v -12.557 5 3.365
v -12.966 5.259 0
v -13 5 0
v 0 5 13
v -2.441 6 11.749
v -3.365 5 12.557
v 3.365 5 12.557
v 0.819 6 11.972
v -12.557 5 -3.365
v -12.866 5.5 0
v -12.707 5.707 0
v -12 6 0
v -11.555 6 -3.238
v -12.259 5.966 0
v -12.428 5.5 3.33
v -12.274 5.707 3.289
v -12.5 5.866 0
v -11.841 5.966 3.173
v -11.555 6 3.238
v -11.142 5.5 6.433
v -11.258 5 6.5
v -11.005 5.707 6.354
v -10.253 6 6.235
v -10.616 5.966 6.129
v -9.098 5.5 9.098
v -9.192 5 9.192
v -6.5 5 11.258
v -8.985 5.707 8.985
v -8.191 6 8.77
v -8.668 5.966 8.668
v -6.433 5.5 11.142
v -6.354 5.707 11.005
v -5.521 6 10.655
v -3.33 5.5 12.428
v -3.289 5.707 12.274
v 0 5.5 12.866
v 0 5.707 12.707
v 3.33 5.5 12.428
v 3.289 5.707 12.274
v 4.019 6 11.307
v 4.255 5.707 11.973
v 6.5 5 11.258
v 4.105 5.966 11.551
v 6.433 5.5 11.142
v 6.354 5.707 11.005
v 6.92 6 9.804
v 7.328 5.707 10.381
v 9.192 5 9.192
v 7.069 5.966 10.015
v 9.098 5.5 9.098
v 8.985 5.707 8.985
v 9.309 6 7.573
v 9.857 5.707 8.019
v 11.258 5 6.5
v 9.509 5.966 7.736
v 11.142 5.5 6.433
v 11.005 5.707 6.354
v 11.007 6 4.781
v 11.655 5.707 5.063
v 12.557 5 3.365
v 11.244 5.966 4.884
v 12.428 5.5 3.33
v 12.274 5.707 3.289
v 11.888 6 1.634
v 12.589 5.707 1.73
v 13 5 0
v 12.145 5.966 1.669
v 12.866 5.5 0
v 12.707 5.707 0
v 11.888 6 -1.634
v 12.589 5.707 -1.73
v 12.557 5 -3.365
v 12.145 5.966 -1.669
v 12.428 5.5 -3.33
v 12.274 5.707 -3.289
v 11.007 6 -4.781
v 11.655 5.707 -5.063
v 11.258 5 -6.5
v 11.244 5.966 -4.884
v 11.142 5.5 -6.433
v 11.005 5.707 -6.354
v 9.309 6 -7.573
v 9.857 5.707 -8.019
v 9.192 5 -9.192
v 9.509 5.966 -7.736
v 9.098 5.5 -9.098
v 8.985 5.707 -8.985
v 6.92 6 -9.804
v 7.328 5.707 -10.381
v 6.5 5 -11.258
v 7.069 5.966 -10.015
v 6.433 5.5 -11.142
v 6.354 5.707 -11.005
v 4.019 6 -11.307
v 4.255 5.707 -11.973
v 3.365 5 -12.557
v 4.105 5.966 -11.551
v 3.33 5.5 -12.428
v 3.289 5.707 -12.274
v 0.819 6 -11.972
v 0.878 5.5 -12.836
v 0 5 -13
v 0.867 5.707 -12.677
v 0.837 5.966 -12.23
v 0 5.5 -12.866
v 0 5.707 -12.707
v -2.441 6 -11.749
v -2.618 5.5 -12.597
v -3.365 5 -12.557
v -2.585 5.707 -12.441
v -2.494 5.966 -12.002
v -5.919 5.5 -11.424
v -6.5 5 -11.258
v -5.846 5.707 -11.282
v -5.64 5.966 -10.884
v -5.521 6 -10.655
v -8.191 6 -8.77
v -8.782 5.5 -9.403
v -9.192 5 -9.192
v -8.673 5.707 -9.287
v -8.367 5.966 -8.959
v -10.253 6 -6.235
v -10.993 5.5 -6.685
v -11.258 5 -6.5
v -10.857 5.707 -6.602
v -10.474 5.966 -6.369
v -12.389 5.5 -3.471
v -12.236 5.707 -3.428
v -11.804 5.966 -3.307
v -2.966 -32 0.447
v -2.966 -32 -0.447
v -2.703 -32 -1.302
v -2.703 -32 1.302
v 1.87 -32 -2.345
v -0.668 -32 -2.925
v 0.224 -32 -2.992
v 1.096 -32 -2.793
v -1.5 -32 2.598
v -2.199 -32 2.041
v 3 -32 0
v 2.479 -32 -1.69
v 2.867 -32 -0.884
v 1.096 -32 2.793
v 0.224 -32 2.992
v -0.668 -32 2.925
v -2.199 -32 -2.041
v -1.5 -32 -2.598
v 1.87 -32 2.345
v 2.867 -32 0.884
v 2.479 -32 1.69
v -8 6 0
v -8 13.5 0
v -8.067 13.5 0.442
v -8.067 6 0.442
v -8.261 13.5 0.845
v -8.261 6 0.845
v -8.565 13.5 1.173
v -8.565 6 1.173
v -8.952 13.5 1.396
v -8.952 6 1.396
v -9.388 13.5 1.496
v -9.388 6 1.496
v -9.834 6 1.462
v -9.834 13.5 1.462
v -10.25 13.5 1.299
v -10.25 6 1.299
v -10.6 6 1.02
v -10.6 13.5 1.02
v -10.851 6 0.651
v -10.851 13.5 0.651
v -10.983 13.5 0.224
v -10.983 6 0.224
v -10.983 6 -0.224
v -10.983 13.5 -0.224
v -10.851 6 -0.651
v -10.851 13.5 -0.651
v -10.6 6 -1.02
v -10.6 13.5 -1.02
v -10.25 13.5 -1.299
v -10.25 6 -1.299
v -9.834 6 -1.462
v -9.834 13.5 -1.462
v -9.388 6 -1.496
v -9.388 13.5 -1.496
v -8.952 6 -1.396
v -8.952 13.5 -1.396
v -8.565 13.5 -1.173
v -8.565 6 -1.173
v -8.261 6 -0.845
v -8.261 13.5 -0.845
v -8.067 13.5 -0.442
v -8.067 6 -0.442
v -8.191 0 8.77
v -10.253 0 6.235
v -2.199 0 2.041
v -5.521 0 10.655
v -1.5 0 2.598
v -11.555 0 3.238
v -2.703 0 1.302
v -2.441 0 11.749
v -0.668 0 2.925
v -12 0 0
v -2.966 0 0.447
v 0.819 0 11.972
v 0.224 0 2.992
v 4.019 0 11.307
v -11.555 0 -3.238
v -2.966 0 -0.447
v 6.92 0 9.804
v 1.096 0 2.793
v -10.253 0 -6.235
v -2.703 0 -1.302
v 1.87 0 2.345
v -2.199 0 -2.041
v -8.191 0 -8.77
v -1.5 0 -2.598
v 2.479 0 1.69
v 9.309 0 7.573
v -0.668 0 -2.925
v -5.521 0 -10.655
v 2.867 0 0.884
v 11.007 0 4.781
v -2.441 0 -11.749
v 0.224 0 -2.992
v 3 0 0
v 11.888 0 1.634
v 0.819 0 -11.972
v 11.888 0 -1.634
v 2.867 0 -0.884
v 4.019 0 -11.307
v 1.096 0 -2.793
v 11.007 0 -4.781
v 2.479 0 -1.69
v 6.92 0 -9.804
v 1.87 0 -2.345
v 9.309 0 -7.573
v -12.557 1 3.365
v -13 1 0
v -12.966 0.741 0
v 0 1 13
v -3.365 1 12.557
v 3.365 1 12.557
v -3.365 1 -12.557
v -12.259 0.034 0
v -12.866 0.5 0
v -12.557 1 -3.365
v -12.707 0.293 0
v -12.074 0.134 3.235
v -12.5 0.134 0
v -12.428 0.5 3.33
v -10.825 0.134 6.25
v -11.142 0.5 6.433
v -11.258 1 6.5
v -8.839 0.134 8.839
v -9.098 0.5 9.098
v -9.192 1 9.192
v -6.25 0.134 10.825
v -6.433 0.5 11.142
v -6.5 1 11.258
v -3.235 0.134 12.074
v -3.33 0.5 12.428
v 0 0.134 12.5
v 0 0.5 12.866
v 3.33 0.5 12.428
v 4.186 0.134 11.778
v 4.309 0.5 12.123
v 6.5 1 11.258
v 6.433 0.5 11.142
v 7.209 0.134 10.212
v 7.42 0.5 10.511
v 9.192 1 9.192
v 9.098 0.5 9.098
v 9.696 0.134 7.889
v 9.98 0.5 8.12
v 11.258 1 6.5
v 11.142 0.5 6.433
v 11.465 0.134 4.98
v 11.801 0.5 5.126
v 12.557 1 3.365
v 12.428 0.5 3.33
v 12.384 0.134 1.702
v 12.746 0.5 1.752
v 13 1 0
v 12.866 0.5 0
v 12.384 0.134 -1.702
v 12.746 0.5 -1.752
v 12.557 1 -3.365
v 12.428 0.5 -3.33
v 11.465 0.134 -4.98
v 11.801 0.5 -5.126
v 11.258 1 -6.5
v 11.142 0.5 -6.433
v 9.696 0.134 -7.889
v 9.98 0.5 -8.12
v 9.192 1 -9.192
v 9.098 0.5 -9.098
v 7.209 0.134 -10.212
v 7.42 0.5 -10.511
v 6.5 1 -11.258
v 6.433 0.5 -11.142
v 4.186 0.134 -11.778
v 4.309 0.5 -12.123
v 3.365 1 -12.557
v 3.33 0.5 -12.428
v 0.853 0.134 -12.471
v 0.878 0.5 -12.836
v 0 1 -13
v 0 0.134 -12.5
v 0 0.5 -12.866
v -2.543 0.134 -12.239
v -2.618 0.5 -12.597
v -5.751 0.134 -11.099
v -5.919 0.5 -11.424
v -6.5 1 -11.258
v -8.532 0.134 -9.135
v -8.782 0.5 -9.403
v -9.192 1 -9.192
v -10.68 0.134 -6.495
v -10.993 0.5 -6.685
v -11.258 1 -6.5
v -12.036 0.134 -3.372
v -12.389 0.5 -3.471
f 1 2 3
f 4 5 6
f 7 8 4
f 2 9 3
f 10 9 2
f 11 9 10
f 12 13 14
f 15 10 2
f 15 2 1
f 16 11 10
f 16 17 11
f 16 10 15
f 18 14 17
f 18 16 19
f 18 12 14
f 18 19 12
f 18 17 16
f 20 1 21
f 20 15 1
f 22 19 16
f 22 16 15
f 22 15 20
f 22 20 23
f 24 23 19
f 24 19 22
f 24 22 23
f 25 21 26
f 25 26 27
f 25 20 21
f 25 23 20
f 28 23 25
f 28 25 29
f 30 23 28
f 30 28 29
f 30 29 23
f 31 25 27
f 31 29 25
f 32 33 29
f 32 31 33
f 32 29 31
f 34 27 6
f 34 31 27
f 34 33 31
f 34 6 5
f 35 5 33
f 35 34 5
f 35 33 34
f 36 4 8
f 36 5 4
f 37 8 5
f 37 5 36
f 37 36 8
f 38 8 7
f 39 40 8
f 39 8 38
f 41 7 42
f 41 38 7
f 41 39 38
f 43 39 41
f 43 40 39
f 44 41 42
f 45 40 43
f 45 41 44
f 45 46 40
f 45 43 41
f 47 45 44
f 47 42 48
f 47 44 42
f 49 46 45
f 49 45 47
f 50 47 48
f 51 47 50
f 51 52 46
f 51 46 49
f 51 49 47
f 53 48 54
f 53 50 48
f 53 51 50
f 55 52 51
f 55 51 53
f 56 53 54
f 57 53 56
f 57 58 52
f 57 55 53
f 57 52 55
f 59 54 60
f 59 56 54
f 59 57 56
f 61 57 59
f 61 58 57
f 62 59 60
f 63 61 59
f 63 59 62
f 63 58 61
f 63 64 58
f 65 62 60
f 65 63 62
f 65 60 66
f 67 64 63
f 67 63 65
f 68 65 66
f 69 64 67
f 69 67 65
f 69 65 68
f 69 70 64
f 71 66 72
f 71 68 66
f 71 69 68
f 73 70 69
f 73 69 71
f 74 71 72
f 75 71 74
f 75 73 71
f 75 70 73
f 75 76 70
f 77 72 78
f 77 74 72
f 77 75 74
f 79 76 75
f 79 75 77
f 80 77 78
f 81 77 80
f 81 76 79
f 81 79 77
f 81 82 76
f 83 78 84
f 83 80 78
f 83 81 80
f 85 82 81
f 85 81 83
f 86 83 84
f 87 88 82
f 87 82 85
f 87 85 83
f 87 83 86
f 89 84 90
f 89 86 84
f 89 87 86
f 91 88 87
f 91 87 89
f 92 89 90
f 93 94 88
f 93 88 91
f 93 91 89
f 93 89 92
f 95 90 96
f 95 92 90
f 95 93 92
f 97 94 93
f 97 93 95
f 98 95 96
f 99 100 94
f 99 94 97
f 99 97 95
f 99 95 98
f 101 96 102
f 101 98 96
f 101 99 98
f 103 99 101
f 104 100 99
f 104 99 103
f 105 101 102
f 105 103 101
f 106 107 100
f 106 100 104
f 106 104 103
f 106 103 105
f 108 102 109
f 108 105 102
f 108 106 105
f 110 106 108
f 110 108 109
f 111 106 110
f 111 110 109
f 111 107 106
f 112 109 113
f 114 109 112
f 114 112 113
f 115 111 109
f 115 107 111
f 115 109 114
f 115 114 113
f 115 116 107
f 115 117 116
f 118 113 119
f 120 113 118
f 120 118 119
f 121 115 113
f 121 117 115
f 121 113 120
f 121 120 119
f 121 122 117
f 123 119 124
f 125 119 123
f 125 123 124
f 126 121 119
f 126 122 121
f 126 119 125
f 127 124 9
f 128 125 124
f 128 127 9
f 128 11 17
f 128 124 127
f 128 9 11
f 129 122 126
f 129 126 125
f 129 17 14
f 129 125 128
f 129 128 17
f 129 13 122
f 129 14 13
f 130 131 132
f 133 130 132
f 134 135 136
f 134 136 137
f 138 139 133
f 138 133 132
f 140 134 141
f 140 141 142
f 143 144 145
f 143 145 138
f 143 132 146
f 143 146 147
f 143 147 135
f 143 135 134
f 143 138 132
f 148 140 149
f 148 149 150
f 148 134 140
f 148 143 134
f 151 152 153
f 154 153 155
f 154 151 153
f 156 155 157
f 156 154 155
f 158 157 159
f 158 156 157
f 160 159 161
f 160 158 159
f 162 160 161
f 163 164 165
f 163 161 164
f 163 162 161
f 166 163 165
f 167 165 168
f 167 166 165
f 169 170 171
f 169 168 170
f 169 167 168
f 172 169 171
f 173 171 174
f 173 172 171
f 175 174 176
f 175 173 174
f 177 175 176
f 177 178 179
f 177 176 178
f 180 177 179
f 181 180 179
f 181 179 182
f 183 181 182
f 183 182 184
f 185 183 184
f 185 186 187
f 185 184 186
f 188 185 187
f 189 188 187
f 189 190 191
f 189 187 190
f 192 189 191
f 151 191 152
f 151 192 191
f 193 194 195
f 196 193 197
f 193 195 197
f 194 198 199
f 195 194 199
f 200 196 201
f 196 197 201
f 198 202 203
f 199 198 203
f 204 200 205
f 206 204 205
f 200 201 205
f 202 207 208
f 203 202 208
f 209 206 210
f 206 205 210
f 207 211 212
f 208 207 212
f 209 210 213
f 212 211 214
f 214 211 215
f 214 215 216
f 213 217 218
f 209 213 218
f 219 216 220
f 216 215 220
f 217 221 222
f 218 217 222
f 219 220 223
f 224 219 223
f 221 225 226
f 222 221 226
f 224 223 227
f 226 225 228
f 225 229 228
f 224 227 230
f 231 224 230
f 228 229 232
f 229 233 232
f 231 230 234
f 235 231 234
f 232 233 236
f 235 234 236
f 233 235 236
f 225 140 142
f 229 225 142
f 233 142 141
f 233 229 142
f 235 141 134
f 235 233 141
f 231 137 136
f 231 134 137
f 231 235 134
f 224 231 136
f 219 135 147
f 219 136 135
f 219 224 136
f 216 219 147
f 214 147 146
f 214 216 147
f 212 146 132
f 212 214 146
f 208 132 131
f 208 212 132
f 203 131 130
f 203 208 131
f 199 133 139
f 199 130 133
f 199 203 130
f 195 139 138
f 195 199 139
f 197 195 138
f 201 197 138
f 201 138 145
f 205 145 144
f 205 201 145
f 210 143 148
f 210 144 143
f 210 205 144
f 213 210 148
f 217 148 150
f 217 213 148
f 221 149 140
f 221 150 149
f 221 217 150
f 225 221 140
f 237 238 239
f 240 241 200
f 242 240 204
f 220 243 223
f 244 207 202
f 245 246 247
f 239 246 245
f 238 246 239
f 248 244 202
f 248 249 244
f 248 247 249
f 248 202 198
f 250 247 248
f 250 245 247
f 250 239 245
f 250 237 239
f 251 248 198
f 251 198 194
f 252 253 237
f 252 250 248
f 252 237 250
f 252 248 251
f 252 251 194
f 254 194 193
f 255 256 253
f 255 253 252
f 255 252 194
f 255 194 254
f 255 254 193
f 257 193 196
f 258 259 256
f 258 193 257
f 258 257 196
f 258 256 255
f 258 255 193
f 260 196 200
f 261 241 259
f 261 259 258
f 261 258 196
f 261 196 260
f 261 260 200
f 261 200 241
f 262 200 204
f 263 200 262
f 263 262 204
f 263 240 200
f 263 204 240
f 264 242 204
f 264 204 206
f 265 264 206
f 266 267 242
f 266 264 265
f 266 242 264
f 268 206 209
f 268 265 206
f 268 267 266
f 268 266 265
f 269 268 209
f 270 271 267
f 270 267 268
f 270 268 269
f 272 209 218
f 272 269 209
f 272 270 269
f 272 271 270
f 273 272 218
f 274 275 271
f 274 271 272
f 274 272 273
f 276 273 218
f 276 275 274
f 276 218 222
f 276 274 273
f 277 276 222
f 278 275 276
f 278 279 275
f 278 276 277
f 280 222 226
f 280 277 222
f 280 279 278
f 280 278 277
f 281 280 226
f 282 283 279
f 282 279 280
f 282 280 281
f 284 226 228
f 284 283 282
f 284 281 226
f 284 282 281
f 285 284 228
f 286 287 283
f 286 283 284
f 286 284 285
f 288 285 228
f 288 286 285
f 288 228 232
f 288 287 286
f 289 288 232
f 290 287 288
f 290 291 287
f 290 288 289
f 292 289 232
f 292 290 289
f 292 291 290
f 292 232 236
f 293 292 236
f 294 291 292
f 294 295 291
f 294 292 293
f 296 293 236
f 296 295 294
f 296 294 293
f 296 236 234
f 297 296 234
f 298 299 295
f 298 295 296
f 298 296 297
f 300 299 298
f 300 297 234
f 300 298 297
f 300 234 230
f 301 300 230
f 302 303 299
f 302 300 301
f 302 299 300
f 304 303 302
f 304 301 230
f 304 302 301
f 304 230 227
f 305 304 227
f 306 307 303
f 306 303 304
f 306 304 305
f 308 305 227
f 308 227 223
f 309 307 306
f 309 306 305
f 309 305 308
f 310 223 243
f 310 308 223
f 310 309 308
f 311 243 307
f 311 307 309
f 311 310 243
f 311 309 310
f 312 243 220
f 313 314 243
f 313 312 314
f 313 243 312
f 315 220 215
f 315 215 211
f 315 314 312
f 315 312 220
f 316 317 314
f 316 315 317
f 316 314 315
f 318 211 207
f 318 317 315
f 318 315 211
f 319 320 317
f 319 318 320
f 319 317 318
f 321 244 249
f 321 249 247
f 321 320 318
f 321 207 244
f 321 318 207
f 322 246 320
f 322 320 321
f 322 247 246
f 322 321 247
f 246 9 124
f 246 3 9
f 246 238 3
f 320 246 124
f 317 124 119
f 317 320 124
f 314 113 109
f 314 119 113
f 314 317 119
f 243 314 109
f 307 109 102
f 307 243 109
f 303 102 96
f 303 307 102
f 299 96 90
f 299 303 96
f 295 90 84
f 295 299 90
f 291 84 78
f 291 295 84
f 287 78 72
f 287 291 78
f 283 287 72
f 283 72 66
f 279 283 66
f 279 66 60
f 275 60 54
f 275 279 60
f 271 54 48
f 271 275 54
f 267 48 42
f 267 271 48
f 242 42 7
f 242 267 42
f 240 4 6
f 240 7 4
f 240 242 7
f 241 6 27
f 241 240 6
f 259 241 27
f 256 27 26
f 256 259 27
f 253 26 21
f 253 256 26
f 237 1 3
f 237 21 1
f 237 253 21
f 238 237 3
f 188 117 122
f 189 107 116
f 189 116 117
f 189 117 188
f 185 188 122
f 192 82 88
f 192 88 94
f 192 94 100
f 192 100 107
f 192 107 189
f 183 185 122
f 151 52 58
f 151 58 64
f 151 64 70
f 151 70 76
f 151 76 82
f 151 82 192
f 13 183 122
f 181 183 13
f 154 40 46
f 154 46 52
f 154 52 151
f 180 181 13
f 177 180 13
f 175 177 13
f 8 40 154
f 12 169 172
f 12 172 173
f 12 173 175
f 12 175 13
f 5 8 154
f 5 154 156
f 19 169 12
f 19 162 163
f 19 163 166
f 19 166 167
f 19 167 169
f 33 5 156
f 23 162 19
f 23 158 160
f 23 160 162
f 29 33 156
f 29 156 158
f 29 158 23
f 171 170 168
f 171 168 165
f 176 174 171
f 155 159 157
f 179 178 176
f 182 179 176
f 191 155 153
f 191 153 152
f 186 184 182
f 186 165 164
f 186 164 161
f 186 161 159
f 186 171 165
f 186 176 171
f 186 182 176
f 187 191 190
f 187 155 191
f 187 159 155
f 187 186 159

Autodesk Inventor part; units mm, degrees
ref_plane "YZ Plane" through (0, 0, 0) normal (1, 0, 0) x (0, 1, 0)
ref_plane "XZ Plane" through (0, 0, 0) normal (0, 1, 0) x (-1, 0, 0)
ref_plane "XY Plane" through (0, 0, 0) normal (0, 0, 1) x (1, 0, 0)
sketch "Skizze1" plane through (0, 0, 0) normal (0, 1, 0) x (-1, 0, 0)
  circle A0 centre (0, 0) radius 13
  dimension "d0" = 26
extrude "Extrusion1" add sketch "Skizze1" along normal blind 6
sketch "Skizze2" plane through (0, 0, 0) normal (0, -1, 0) x (1, 0, 0)
  circle A0 centre (0, 0) radius 3
  dimension "d3" = 6
extrude "Extrusion2" add sketch "Skizze2" along normal blind 32
sketch "Skizze3" plane through (0, 0, 0) normal (0, 1, 0) x (1, 0, 0)
  circle A0 centre (-9.5, 0) radius 1.5
  point P0 (0, 0)
  dimension "d6" = 3
  dimension "d7" = 9.5
extrude "Extrusion3" add sketch "Skizze3" along normal blind 13.5
fillet "Rundung1" radius 1 2 edges at (13, 0, 0) (13, 6, 0)
properties part number "handle" material "Stahl, weich"
